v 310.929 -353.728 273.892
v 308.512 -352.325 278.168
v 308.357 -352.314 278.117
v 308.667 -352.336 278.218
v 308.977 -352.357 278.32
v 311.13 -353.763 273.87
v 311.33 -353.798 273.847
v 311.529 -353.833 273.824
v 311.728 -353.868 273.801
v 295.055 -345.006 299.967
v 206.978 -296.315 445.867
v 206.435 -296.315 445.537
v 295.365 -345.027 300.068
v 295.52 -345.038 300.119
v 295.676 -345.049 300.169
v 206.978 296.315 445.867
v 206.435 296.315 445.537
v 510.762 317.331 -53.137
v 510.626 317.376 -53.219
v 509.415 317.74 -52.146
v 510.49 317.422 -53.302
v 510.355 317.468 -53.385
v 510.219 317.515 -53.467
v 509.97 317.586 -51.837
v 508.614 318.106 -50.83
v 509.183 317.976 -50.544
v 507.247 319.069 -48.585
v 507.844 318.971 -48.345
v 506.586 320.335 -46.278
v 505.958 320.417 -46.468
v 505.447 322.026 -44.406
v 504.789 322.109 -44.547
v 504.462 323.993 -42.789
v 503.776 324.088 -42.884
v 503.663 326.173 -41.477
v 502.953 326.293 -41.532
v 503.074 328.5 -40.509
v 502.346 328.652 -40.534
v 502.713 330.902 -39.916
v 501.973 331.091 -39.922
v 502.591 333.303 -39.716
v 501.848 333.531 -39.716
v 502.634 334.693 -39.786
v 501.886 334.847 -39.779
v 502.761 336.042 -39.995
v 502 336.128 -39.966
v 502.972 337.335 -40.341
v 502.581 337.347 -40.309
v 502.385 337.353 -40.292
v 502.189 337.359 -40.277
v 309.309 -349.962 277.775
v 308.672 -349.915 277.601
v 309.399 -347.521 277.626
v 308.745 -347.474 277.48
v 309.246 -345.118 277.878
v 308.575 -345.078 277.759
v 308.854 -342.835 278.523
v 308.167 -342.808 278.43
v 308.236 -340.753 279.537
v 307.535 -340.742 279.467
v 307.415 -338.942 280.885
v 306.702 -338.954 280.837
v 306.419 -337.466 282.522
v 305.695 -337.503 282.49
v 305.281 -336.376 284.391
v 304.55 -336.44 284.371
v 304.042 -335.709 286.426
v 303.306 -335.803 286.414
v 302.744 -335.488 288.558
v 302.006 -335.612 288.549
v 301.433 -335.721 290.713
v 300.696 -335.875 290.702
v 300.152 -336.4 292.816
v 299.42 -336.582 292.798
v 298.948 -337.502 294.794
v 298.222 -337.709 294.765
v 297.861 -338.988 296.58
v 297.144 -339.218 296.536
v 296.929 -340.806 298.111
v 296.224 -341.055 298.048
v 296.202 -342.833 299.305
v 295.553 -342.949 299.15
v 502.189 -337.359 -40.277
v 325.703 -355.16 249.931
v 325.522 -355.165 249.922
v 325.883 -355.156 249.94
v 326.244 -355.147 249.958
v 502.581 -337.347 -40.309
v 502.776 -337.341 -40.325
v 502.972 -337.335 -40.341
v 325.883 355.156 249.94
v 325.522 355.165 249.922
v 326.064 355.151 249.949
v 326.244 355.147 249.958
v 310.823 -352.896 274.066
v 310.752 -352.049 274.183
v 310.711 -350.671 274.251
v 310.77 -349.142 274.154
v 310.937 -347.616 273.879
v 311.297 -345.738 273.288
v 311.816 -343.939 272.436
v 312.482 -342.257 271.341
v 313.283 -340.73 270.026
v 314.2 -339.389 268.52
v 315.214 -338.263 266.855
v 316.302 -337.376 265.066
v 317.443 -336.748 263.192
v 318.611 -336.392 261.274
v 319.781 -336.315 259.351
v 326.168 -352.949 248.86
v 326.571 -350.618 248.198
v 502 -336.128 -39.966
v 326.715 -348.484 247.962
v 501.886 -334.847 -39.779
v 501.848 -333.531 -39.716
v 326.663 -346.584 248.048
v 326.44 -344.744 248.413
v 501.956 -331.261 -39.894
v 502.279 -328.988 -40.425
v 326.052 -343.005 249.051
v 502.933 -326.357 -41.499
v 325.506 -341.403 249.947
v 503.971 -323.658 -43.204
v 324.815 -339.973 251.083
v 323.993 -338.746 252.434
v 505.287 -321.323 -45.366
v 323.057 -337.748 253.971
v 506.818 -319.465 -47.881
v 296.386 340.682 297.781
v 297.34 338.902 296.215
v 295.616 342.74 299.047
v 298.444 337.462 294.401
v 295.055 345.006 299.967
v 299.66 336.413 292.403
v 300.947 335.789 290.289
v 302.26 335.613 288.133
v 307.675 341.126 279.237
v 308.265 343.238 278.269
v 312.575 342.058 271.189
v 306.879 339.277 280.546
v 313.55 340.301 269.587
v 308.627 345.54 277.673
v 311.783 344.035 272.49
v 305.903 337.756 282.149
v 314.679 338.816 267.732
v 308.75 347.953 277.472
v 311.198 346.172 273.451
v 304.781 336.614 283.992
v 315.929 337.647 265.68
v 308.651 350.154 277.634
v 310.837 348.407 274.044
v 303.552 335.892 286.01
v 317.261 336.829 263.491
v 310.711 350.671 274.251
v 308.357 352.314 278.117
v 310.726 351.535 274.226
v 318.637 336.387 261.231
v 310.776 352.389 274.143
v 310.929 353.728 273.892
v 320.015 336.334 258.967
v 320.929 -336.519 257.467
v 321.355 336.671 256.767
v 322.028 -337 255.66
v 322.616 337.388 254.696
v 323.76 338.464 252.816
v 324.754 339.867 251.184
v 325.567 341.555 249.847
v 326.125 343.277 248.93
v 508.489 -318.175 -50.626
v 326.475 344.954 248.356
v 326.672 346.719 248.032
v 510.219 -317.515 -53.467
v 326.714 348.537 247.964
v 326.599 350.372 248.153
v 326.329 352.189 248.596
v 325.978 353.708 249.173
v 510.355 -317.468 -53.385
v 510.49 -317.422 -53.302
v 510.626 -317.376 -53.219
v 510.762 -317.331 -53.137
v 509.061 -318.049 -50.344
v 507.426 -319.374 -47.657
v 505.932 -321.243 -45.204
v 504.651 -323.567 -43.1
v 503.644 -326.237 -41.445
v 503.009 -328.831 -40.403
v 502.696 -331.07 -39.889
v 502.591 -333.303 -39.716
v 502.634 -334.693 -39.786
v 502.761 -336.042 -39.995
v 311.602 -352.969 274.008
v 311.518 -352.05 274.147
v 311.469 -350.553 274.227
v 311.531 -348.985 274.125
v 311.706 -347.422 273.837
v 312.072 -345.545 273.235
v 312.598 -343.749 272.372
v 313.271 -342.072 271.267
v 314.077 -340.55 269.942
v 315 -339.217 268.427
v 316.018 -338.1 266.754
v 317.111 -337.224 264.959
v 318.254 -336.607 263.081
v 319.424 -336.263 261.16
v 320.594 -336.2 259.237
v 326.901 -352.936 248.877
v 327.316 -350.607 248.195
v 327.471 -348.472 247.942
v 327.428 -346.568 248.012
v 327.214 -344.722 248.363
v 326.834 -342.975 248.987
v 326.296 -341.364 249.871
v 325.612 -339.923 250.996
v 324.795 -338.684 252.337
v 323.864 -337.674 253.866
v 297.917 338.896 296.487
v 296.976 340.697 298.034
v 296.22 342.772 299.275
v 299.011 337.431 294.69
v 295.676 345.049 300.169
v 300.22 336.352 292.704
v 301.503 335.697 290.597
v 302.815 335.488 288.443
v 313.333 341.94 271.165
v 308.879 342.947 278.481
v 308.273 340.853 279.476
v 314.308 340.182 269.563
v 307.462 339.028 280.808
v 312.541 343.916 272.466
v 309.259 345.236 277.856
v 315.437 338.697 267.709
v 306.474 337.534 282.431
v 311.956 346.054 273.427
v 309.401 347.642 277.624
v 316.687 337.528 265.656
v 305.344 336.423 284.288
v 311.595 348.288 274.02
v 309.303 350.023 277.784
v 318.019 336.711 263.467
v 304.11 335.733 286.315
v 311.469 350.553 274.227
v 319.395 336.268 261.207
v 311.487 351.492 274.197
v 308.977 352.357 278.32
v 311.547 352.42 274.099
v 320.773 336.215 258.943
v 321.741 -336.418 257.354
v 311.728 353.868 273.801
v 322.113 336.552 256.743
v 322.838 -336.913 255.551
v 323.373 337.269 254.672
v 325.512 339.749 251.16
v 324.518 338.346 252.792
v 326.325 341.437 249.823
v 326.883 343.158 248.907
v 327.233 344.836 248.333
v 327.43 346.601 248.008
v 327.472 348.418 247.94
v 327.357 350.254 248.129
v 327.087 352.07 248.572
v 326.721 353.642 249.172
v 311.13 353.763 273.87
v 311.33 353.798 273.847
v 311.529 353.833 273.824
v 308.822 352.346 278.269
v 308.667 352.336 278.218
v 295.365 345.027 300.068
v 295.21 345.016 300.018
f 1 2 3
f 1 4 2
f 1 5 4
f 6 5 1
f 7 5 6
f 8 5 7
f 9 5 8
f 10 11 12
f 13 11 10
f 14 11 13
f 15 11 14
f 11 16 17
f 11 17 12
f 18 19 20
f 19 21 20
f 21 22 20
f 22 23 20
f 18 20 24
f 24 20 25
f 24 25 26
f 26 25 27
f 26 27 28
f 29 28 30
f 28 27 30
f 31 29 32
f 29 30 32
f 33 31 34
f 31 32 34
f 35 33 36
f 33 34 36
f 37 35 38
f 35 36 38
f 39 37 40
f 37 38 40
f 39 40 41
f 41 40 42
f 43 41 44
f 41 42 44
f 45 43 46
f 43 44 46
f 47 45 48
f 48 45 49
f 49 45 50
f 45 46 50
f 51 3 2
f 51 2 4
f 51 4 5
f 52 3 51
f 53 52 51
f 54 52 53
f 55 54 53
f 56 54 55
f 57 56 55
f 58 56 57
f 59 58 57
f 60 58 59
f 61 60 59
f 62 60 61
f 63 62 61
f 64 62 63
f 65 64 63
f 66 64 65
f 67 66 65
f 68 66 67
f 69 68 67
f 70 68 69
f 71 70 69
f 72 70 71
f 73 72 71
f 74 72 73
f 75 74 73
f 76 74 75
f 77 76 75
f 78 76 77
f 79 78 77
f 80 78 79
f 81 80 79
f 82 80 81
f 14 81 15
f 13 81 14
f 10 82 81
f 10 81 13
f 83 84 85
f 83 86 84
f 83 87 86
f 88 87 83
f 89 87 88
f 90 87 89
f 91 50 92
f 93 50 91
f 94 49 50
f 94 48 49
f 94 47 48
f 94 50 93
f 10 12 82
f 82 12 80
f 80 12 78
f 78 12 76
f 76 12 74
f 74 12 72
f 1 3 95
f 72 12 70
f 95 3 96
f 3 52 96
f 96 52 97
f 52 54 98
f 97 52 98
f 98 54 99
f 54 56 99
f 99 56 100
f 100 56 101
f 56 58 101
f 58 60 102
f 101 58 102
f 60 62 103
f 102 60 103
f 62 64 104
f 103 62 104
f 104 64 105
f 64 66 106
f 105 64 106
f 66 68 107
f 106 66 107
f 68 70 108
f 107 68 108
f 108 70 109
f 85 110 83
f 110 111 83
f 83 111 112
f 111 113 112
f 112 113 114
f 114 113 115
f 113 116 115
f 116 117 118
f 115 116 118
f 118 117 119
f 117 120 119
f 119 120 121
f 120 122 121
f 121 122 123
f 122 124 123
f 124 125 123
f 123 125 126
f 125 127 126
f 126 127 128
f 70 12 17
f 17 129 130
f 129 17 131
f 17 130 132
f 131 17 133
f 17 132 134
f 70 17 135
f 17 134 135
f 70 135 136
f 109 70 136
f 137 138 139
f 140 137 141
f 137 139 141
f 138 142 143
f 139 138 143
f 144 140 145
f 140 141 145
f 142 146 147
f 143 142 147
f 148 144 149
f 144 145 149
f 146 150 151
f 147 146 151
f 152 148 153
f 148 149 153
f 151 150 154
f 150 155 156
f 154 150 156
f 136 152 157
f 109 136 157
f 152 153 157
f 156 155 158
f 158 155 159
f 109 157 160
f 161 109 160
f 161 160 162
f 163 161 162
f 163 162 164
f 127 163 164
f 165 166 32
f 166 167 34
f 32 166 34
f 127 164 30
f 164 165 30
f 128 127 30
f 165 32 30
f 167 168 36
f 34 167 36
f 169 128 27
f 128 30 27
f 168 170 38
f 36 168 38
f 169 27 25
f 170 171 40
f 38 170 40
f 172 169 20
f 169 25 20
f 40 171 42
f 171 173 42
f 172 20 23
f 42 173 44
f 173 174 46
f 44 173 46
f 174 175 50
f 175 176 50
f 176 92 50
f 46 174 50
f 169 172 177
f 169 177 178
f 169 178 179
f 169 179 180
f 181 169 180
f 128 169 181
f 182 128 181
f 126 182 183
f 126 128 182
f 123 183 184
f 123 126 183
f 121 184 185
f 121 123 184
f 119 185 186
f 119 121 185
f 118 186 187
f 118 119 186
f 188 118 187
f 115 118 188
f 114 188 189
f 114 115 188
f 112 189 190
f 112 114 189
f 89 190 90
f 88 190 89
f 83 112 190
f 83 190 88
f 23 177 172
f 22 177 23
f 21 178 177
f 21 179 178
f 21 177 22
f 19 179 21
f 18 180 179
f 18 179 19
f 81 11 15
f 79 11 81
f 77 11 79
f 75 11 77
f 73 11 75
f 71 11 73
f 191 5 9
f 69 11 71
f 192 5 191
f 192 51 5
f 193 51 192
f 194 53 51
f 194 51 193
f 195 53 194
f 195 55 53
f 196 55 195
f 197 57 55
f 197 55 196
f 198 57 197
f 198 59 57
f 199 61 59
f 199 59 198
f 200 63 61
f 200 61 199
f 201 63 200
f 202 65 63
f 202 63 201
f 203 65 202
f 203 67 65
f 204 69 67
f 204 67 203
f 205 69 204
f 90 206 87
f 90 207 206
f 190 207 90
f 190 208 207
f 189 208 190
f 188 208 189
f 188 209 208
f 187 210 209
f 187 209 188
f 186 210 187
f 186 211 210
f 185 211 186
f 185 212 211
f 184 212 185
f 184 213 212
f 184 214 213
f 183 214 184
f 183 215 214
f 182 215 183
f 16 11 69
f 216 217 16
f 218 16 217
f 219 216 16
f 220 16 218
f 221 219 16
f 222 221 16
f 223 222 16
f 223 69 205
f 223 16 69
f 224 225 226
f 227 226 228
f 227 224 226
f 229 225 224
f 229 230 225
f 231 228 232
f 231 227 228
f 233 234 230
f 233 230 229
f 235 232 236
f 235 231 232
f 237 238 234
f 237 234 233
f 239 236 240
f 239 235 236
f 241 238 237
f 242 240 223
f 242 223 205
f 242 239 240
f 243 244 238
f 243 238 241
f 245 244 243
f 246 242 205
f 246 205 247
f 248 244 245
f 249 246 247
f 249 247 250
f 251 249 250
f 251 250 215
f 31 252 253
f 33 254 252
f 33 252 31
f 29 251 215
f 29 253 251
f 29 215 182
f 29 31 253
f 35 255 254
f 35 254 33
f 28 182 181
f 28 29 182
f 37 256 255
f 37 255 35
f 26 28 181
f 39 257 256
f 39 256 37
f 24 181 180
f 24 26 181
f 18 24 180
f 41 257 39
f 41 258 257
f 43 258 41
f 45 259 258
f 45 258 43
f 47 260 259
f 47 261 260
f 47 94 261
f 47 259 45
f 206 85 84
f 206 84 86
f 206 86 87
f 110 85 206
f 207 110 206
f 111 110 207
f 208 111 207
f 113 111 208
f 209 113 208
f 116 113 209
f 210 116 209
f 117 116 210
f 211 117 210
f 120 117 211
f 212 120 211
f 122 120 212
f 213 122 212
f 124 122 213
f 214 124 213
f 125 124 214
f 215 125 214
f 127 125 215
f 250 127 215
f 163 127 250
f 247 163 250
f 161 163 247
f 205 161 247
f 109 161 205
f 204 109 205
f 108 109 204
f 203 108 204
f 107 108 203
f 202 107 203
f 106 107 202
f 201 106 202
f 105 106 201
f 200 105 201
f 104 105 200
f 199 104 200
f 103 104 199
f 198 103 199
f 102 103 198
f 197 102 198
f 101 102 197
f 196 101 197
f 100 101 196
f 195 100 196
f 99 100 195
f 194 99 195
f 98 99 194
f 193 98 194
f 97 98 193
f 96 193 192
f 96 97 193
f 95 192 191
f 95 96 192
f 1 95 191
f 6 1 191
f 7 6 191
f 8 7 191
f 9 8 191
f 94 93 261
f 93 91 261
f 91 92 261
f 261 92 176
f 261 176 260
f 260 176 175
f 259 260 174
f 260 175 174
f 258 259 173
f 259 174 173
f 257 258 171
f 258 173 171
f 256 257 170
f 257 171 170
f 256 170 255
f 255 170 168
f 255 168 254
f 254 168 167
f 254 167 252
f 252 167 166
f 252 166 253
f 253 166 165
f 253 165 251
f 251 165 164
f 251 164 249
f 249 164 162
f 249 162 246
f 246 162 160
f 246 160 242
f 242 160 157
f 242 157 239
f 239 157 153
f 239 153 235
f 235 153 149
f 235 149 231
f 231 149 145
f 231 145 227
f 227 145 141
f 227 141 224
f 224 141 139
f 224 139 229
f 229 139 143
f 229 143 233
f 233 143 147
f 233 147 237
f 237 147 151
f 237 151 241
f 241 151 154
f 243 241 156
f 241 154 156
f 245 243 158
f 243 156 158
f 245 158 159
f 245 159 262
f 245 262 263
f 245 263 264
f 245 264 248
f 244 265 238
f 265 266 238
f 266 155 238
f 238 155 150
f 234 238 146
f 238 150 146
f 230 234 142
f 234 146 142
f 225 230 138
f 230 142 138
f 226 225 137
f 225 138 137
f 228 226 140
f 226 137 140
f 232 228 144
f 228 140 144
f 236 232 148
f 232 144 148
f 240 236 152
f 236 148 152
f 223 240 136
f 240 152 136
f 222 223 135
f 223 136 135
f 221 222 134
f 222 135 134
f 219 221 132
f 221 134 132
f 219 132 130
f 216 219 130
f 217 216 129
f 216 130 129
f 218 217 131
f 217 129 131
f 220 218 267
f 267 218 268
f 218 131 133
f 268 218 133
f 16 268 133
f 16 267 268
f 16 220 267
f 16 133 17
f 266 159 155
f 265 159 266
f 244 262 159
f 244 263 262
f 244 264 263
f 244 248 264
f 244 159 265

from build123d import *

# Parameters (mm, degrees)
BOSS_EXTRUDE1_DEPTH = 0.3175
SKETCH4_R           = 12.8905
CUT_EXTRUDE1_DEPTH  = 152.4
SKETCH5_R           = 12.8905
CUT_EXTRUDE2_DEPTH  = 152.4
SKETCH6_R           = 12.8905
CUT_EXTRUDE3_DEPTH  = 152.4


with BuildPart() as part:
    # Sketch3 → Boss-Extrude1 (new body, symmetric)
    with BuildSketch(Plane(origin=(348.778890993, 0, 212.329779666), x_dir=(0.519999813, 0, -0.854166374), z_dir=(0.854166374, 0, 0.519999813))):
        Polygon((310.98364901, 0), (310.98364901, 336.55), (-63.66635099, 356.184574508), (-273.21635099, 296.314909512), (-273.21635099, 0), align=None)
        Polygon((310.98364901, -336.55), (310.98364901, 0), (-273.21635099, 0), (-273.21635099, -296.314909512), (-63.66635099, -356.184574508), align=None)
    extrude(amount=BOSS_EXTRUDE1_DEPTH, both=True)

    # Sketch4 → Cut-Extrude1 (cut)
    with BuildSketch(Plane(origin=(381.685291714, 370.332, -52.606299668), x_dir=(0, 0, 1), z_dir=(-0.956162433, 0.292836818, 0))):
        Circle(SKETCH4_R)
    cut_extrude1 = extrude(amount=-CUT_EXTRUDE1_DEPTH, mode=Mode.SUBTRACT)

    # Sketch5 → Cut-Extrude2 (cut)
    with BuildSketch(Plane(origin=(197.535291714, 368.359946538, 264.893700332), x_dir=(0.030514213, -0.004769179, 0.999522955), z_dir=(-0.987534126, 0.154345353, 0.030884661))):
        Circle(SKETCH5_R)
    cut_extrude2 = extrude(amount=-CUT_EXTRUDE2_DEPTH, mode=Mode.SUBTRACT)

    # Sketch6 → Cut-Extrude3 (cut)
    with BuildSketch(Plane(origin=(197.535291714, 368.359946538, 264.893700332), x_dir=(-0.218520162, 0.041163819, 0.974963835), z_dir=(-0.958112576, 0.180484822, -0.222363489))):
        Circle(SKETCH6_R)
    cut_extrude3 = extrude(amount=-CUT_EXTRUDE3_DEPTH, mode=Mode.SUBTRACT)

    # Mirror1: Cut-Extrude1, Cut-Extrude2, Cut-Extrude3 across plane
    add(cut_extrude1.mirror(Plane.ZX), mode=Mode.SUBTRACT)
    add(cut_extrude2.mirror(Plane.ZX), mode=Mode.SUBTRACT)
    add(cut_extrude3.mirror(Plane.ZX), mode=Mode.SUBTRACT)


solid = part.part
